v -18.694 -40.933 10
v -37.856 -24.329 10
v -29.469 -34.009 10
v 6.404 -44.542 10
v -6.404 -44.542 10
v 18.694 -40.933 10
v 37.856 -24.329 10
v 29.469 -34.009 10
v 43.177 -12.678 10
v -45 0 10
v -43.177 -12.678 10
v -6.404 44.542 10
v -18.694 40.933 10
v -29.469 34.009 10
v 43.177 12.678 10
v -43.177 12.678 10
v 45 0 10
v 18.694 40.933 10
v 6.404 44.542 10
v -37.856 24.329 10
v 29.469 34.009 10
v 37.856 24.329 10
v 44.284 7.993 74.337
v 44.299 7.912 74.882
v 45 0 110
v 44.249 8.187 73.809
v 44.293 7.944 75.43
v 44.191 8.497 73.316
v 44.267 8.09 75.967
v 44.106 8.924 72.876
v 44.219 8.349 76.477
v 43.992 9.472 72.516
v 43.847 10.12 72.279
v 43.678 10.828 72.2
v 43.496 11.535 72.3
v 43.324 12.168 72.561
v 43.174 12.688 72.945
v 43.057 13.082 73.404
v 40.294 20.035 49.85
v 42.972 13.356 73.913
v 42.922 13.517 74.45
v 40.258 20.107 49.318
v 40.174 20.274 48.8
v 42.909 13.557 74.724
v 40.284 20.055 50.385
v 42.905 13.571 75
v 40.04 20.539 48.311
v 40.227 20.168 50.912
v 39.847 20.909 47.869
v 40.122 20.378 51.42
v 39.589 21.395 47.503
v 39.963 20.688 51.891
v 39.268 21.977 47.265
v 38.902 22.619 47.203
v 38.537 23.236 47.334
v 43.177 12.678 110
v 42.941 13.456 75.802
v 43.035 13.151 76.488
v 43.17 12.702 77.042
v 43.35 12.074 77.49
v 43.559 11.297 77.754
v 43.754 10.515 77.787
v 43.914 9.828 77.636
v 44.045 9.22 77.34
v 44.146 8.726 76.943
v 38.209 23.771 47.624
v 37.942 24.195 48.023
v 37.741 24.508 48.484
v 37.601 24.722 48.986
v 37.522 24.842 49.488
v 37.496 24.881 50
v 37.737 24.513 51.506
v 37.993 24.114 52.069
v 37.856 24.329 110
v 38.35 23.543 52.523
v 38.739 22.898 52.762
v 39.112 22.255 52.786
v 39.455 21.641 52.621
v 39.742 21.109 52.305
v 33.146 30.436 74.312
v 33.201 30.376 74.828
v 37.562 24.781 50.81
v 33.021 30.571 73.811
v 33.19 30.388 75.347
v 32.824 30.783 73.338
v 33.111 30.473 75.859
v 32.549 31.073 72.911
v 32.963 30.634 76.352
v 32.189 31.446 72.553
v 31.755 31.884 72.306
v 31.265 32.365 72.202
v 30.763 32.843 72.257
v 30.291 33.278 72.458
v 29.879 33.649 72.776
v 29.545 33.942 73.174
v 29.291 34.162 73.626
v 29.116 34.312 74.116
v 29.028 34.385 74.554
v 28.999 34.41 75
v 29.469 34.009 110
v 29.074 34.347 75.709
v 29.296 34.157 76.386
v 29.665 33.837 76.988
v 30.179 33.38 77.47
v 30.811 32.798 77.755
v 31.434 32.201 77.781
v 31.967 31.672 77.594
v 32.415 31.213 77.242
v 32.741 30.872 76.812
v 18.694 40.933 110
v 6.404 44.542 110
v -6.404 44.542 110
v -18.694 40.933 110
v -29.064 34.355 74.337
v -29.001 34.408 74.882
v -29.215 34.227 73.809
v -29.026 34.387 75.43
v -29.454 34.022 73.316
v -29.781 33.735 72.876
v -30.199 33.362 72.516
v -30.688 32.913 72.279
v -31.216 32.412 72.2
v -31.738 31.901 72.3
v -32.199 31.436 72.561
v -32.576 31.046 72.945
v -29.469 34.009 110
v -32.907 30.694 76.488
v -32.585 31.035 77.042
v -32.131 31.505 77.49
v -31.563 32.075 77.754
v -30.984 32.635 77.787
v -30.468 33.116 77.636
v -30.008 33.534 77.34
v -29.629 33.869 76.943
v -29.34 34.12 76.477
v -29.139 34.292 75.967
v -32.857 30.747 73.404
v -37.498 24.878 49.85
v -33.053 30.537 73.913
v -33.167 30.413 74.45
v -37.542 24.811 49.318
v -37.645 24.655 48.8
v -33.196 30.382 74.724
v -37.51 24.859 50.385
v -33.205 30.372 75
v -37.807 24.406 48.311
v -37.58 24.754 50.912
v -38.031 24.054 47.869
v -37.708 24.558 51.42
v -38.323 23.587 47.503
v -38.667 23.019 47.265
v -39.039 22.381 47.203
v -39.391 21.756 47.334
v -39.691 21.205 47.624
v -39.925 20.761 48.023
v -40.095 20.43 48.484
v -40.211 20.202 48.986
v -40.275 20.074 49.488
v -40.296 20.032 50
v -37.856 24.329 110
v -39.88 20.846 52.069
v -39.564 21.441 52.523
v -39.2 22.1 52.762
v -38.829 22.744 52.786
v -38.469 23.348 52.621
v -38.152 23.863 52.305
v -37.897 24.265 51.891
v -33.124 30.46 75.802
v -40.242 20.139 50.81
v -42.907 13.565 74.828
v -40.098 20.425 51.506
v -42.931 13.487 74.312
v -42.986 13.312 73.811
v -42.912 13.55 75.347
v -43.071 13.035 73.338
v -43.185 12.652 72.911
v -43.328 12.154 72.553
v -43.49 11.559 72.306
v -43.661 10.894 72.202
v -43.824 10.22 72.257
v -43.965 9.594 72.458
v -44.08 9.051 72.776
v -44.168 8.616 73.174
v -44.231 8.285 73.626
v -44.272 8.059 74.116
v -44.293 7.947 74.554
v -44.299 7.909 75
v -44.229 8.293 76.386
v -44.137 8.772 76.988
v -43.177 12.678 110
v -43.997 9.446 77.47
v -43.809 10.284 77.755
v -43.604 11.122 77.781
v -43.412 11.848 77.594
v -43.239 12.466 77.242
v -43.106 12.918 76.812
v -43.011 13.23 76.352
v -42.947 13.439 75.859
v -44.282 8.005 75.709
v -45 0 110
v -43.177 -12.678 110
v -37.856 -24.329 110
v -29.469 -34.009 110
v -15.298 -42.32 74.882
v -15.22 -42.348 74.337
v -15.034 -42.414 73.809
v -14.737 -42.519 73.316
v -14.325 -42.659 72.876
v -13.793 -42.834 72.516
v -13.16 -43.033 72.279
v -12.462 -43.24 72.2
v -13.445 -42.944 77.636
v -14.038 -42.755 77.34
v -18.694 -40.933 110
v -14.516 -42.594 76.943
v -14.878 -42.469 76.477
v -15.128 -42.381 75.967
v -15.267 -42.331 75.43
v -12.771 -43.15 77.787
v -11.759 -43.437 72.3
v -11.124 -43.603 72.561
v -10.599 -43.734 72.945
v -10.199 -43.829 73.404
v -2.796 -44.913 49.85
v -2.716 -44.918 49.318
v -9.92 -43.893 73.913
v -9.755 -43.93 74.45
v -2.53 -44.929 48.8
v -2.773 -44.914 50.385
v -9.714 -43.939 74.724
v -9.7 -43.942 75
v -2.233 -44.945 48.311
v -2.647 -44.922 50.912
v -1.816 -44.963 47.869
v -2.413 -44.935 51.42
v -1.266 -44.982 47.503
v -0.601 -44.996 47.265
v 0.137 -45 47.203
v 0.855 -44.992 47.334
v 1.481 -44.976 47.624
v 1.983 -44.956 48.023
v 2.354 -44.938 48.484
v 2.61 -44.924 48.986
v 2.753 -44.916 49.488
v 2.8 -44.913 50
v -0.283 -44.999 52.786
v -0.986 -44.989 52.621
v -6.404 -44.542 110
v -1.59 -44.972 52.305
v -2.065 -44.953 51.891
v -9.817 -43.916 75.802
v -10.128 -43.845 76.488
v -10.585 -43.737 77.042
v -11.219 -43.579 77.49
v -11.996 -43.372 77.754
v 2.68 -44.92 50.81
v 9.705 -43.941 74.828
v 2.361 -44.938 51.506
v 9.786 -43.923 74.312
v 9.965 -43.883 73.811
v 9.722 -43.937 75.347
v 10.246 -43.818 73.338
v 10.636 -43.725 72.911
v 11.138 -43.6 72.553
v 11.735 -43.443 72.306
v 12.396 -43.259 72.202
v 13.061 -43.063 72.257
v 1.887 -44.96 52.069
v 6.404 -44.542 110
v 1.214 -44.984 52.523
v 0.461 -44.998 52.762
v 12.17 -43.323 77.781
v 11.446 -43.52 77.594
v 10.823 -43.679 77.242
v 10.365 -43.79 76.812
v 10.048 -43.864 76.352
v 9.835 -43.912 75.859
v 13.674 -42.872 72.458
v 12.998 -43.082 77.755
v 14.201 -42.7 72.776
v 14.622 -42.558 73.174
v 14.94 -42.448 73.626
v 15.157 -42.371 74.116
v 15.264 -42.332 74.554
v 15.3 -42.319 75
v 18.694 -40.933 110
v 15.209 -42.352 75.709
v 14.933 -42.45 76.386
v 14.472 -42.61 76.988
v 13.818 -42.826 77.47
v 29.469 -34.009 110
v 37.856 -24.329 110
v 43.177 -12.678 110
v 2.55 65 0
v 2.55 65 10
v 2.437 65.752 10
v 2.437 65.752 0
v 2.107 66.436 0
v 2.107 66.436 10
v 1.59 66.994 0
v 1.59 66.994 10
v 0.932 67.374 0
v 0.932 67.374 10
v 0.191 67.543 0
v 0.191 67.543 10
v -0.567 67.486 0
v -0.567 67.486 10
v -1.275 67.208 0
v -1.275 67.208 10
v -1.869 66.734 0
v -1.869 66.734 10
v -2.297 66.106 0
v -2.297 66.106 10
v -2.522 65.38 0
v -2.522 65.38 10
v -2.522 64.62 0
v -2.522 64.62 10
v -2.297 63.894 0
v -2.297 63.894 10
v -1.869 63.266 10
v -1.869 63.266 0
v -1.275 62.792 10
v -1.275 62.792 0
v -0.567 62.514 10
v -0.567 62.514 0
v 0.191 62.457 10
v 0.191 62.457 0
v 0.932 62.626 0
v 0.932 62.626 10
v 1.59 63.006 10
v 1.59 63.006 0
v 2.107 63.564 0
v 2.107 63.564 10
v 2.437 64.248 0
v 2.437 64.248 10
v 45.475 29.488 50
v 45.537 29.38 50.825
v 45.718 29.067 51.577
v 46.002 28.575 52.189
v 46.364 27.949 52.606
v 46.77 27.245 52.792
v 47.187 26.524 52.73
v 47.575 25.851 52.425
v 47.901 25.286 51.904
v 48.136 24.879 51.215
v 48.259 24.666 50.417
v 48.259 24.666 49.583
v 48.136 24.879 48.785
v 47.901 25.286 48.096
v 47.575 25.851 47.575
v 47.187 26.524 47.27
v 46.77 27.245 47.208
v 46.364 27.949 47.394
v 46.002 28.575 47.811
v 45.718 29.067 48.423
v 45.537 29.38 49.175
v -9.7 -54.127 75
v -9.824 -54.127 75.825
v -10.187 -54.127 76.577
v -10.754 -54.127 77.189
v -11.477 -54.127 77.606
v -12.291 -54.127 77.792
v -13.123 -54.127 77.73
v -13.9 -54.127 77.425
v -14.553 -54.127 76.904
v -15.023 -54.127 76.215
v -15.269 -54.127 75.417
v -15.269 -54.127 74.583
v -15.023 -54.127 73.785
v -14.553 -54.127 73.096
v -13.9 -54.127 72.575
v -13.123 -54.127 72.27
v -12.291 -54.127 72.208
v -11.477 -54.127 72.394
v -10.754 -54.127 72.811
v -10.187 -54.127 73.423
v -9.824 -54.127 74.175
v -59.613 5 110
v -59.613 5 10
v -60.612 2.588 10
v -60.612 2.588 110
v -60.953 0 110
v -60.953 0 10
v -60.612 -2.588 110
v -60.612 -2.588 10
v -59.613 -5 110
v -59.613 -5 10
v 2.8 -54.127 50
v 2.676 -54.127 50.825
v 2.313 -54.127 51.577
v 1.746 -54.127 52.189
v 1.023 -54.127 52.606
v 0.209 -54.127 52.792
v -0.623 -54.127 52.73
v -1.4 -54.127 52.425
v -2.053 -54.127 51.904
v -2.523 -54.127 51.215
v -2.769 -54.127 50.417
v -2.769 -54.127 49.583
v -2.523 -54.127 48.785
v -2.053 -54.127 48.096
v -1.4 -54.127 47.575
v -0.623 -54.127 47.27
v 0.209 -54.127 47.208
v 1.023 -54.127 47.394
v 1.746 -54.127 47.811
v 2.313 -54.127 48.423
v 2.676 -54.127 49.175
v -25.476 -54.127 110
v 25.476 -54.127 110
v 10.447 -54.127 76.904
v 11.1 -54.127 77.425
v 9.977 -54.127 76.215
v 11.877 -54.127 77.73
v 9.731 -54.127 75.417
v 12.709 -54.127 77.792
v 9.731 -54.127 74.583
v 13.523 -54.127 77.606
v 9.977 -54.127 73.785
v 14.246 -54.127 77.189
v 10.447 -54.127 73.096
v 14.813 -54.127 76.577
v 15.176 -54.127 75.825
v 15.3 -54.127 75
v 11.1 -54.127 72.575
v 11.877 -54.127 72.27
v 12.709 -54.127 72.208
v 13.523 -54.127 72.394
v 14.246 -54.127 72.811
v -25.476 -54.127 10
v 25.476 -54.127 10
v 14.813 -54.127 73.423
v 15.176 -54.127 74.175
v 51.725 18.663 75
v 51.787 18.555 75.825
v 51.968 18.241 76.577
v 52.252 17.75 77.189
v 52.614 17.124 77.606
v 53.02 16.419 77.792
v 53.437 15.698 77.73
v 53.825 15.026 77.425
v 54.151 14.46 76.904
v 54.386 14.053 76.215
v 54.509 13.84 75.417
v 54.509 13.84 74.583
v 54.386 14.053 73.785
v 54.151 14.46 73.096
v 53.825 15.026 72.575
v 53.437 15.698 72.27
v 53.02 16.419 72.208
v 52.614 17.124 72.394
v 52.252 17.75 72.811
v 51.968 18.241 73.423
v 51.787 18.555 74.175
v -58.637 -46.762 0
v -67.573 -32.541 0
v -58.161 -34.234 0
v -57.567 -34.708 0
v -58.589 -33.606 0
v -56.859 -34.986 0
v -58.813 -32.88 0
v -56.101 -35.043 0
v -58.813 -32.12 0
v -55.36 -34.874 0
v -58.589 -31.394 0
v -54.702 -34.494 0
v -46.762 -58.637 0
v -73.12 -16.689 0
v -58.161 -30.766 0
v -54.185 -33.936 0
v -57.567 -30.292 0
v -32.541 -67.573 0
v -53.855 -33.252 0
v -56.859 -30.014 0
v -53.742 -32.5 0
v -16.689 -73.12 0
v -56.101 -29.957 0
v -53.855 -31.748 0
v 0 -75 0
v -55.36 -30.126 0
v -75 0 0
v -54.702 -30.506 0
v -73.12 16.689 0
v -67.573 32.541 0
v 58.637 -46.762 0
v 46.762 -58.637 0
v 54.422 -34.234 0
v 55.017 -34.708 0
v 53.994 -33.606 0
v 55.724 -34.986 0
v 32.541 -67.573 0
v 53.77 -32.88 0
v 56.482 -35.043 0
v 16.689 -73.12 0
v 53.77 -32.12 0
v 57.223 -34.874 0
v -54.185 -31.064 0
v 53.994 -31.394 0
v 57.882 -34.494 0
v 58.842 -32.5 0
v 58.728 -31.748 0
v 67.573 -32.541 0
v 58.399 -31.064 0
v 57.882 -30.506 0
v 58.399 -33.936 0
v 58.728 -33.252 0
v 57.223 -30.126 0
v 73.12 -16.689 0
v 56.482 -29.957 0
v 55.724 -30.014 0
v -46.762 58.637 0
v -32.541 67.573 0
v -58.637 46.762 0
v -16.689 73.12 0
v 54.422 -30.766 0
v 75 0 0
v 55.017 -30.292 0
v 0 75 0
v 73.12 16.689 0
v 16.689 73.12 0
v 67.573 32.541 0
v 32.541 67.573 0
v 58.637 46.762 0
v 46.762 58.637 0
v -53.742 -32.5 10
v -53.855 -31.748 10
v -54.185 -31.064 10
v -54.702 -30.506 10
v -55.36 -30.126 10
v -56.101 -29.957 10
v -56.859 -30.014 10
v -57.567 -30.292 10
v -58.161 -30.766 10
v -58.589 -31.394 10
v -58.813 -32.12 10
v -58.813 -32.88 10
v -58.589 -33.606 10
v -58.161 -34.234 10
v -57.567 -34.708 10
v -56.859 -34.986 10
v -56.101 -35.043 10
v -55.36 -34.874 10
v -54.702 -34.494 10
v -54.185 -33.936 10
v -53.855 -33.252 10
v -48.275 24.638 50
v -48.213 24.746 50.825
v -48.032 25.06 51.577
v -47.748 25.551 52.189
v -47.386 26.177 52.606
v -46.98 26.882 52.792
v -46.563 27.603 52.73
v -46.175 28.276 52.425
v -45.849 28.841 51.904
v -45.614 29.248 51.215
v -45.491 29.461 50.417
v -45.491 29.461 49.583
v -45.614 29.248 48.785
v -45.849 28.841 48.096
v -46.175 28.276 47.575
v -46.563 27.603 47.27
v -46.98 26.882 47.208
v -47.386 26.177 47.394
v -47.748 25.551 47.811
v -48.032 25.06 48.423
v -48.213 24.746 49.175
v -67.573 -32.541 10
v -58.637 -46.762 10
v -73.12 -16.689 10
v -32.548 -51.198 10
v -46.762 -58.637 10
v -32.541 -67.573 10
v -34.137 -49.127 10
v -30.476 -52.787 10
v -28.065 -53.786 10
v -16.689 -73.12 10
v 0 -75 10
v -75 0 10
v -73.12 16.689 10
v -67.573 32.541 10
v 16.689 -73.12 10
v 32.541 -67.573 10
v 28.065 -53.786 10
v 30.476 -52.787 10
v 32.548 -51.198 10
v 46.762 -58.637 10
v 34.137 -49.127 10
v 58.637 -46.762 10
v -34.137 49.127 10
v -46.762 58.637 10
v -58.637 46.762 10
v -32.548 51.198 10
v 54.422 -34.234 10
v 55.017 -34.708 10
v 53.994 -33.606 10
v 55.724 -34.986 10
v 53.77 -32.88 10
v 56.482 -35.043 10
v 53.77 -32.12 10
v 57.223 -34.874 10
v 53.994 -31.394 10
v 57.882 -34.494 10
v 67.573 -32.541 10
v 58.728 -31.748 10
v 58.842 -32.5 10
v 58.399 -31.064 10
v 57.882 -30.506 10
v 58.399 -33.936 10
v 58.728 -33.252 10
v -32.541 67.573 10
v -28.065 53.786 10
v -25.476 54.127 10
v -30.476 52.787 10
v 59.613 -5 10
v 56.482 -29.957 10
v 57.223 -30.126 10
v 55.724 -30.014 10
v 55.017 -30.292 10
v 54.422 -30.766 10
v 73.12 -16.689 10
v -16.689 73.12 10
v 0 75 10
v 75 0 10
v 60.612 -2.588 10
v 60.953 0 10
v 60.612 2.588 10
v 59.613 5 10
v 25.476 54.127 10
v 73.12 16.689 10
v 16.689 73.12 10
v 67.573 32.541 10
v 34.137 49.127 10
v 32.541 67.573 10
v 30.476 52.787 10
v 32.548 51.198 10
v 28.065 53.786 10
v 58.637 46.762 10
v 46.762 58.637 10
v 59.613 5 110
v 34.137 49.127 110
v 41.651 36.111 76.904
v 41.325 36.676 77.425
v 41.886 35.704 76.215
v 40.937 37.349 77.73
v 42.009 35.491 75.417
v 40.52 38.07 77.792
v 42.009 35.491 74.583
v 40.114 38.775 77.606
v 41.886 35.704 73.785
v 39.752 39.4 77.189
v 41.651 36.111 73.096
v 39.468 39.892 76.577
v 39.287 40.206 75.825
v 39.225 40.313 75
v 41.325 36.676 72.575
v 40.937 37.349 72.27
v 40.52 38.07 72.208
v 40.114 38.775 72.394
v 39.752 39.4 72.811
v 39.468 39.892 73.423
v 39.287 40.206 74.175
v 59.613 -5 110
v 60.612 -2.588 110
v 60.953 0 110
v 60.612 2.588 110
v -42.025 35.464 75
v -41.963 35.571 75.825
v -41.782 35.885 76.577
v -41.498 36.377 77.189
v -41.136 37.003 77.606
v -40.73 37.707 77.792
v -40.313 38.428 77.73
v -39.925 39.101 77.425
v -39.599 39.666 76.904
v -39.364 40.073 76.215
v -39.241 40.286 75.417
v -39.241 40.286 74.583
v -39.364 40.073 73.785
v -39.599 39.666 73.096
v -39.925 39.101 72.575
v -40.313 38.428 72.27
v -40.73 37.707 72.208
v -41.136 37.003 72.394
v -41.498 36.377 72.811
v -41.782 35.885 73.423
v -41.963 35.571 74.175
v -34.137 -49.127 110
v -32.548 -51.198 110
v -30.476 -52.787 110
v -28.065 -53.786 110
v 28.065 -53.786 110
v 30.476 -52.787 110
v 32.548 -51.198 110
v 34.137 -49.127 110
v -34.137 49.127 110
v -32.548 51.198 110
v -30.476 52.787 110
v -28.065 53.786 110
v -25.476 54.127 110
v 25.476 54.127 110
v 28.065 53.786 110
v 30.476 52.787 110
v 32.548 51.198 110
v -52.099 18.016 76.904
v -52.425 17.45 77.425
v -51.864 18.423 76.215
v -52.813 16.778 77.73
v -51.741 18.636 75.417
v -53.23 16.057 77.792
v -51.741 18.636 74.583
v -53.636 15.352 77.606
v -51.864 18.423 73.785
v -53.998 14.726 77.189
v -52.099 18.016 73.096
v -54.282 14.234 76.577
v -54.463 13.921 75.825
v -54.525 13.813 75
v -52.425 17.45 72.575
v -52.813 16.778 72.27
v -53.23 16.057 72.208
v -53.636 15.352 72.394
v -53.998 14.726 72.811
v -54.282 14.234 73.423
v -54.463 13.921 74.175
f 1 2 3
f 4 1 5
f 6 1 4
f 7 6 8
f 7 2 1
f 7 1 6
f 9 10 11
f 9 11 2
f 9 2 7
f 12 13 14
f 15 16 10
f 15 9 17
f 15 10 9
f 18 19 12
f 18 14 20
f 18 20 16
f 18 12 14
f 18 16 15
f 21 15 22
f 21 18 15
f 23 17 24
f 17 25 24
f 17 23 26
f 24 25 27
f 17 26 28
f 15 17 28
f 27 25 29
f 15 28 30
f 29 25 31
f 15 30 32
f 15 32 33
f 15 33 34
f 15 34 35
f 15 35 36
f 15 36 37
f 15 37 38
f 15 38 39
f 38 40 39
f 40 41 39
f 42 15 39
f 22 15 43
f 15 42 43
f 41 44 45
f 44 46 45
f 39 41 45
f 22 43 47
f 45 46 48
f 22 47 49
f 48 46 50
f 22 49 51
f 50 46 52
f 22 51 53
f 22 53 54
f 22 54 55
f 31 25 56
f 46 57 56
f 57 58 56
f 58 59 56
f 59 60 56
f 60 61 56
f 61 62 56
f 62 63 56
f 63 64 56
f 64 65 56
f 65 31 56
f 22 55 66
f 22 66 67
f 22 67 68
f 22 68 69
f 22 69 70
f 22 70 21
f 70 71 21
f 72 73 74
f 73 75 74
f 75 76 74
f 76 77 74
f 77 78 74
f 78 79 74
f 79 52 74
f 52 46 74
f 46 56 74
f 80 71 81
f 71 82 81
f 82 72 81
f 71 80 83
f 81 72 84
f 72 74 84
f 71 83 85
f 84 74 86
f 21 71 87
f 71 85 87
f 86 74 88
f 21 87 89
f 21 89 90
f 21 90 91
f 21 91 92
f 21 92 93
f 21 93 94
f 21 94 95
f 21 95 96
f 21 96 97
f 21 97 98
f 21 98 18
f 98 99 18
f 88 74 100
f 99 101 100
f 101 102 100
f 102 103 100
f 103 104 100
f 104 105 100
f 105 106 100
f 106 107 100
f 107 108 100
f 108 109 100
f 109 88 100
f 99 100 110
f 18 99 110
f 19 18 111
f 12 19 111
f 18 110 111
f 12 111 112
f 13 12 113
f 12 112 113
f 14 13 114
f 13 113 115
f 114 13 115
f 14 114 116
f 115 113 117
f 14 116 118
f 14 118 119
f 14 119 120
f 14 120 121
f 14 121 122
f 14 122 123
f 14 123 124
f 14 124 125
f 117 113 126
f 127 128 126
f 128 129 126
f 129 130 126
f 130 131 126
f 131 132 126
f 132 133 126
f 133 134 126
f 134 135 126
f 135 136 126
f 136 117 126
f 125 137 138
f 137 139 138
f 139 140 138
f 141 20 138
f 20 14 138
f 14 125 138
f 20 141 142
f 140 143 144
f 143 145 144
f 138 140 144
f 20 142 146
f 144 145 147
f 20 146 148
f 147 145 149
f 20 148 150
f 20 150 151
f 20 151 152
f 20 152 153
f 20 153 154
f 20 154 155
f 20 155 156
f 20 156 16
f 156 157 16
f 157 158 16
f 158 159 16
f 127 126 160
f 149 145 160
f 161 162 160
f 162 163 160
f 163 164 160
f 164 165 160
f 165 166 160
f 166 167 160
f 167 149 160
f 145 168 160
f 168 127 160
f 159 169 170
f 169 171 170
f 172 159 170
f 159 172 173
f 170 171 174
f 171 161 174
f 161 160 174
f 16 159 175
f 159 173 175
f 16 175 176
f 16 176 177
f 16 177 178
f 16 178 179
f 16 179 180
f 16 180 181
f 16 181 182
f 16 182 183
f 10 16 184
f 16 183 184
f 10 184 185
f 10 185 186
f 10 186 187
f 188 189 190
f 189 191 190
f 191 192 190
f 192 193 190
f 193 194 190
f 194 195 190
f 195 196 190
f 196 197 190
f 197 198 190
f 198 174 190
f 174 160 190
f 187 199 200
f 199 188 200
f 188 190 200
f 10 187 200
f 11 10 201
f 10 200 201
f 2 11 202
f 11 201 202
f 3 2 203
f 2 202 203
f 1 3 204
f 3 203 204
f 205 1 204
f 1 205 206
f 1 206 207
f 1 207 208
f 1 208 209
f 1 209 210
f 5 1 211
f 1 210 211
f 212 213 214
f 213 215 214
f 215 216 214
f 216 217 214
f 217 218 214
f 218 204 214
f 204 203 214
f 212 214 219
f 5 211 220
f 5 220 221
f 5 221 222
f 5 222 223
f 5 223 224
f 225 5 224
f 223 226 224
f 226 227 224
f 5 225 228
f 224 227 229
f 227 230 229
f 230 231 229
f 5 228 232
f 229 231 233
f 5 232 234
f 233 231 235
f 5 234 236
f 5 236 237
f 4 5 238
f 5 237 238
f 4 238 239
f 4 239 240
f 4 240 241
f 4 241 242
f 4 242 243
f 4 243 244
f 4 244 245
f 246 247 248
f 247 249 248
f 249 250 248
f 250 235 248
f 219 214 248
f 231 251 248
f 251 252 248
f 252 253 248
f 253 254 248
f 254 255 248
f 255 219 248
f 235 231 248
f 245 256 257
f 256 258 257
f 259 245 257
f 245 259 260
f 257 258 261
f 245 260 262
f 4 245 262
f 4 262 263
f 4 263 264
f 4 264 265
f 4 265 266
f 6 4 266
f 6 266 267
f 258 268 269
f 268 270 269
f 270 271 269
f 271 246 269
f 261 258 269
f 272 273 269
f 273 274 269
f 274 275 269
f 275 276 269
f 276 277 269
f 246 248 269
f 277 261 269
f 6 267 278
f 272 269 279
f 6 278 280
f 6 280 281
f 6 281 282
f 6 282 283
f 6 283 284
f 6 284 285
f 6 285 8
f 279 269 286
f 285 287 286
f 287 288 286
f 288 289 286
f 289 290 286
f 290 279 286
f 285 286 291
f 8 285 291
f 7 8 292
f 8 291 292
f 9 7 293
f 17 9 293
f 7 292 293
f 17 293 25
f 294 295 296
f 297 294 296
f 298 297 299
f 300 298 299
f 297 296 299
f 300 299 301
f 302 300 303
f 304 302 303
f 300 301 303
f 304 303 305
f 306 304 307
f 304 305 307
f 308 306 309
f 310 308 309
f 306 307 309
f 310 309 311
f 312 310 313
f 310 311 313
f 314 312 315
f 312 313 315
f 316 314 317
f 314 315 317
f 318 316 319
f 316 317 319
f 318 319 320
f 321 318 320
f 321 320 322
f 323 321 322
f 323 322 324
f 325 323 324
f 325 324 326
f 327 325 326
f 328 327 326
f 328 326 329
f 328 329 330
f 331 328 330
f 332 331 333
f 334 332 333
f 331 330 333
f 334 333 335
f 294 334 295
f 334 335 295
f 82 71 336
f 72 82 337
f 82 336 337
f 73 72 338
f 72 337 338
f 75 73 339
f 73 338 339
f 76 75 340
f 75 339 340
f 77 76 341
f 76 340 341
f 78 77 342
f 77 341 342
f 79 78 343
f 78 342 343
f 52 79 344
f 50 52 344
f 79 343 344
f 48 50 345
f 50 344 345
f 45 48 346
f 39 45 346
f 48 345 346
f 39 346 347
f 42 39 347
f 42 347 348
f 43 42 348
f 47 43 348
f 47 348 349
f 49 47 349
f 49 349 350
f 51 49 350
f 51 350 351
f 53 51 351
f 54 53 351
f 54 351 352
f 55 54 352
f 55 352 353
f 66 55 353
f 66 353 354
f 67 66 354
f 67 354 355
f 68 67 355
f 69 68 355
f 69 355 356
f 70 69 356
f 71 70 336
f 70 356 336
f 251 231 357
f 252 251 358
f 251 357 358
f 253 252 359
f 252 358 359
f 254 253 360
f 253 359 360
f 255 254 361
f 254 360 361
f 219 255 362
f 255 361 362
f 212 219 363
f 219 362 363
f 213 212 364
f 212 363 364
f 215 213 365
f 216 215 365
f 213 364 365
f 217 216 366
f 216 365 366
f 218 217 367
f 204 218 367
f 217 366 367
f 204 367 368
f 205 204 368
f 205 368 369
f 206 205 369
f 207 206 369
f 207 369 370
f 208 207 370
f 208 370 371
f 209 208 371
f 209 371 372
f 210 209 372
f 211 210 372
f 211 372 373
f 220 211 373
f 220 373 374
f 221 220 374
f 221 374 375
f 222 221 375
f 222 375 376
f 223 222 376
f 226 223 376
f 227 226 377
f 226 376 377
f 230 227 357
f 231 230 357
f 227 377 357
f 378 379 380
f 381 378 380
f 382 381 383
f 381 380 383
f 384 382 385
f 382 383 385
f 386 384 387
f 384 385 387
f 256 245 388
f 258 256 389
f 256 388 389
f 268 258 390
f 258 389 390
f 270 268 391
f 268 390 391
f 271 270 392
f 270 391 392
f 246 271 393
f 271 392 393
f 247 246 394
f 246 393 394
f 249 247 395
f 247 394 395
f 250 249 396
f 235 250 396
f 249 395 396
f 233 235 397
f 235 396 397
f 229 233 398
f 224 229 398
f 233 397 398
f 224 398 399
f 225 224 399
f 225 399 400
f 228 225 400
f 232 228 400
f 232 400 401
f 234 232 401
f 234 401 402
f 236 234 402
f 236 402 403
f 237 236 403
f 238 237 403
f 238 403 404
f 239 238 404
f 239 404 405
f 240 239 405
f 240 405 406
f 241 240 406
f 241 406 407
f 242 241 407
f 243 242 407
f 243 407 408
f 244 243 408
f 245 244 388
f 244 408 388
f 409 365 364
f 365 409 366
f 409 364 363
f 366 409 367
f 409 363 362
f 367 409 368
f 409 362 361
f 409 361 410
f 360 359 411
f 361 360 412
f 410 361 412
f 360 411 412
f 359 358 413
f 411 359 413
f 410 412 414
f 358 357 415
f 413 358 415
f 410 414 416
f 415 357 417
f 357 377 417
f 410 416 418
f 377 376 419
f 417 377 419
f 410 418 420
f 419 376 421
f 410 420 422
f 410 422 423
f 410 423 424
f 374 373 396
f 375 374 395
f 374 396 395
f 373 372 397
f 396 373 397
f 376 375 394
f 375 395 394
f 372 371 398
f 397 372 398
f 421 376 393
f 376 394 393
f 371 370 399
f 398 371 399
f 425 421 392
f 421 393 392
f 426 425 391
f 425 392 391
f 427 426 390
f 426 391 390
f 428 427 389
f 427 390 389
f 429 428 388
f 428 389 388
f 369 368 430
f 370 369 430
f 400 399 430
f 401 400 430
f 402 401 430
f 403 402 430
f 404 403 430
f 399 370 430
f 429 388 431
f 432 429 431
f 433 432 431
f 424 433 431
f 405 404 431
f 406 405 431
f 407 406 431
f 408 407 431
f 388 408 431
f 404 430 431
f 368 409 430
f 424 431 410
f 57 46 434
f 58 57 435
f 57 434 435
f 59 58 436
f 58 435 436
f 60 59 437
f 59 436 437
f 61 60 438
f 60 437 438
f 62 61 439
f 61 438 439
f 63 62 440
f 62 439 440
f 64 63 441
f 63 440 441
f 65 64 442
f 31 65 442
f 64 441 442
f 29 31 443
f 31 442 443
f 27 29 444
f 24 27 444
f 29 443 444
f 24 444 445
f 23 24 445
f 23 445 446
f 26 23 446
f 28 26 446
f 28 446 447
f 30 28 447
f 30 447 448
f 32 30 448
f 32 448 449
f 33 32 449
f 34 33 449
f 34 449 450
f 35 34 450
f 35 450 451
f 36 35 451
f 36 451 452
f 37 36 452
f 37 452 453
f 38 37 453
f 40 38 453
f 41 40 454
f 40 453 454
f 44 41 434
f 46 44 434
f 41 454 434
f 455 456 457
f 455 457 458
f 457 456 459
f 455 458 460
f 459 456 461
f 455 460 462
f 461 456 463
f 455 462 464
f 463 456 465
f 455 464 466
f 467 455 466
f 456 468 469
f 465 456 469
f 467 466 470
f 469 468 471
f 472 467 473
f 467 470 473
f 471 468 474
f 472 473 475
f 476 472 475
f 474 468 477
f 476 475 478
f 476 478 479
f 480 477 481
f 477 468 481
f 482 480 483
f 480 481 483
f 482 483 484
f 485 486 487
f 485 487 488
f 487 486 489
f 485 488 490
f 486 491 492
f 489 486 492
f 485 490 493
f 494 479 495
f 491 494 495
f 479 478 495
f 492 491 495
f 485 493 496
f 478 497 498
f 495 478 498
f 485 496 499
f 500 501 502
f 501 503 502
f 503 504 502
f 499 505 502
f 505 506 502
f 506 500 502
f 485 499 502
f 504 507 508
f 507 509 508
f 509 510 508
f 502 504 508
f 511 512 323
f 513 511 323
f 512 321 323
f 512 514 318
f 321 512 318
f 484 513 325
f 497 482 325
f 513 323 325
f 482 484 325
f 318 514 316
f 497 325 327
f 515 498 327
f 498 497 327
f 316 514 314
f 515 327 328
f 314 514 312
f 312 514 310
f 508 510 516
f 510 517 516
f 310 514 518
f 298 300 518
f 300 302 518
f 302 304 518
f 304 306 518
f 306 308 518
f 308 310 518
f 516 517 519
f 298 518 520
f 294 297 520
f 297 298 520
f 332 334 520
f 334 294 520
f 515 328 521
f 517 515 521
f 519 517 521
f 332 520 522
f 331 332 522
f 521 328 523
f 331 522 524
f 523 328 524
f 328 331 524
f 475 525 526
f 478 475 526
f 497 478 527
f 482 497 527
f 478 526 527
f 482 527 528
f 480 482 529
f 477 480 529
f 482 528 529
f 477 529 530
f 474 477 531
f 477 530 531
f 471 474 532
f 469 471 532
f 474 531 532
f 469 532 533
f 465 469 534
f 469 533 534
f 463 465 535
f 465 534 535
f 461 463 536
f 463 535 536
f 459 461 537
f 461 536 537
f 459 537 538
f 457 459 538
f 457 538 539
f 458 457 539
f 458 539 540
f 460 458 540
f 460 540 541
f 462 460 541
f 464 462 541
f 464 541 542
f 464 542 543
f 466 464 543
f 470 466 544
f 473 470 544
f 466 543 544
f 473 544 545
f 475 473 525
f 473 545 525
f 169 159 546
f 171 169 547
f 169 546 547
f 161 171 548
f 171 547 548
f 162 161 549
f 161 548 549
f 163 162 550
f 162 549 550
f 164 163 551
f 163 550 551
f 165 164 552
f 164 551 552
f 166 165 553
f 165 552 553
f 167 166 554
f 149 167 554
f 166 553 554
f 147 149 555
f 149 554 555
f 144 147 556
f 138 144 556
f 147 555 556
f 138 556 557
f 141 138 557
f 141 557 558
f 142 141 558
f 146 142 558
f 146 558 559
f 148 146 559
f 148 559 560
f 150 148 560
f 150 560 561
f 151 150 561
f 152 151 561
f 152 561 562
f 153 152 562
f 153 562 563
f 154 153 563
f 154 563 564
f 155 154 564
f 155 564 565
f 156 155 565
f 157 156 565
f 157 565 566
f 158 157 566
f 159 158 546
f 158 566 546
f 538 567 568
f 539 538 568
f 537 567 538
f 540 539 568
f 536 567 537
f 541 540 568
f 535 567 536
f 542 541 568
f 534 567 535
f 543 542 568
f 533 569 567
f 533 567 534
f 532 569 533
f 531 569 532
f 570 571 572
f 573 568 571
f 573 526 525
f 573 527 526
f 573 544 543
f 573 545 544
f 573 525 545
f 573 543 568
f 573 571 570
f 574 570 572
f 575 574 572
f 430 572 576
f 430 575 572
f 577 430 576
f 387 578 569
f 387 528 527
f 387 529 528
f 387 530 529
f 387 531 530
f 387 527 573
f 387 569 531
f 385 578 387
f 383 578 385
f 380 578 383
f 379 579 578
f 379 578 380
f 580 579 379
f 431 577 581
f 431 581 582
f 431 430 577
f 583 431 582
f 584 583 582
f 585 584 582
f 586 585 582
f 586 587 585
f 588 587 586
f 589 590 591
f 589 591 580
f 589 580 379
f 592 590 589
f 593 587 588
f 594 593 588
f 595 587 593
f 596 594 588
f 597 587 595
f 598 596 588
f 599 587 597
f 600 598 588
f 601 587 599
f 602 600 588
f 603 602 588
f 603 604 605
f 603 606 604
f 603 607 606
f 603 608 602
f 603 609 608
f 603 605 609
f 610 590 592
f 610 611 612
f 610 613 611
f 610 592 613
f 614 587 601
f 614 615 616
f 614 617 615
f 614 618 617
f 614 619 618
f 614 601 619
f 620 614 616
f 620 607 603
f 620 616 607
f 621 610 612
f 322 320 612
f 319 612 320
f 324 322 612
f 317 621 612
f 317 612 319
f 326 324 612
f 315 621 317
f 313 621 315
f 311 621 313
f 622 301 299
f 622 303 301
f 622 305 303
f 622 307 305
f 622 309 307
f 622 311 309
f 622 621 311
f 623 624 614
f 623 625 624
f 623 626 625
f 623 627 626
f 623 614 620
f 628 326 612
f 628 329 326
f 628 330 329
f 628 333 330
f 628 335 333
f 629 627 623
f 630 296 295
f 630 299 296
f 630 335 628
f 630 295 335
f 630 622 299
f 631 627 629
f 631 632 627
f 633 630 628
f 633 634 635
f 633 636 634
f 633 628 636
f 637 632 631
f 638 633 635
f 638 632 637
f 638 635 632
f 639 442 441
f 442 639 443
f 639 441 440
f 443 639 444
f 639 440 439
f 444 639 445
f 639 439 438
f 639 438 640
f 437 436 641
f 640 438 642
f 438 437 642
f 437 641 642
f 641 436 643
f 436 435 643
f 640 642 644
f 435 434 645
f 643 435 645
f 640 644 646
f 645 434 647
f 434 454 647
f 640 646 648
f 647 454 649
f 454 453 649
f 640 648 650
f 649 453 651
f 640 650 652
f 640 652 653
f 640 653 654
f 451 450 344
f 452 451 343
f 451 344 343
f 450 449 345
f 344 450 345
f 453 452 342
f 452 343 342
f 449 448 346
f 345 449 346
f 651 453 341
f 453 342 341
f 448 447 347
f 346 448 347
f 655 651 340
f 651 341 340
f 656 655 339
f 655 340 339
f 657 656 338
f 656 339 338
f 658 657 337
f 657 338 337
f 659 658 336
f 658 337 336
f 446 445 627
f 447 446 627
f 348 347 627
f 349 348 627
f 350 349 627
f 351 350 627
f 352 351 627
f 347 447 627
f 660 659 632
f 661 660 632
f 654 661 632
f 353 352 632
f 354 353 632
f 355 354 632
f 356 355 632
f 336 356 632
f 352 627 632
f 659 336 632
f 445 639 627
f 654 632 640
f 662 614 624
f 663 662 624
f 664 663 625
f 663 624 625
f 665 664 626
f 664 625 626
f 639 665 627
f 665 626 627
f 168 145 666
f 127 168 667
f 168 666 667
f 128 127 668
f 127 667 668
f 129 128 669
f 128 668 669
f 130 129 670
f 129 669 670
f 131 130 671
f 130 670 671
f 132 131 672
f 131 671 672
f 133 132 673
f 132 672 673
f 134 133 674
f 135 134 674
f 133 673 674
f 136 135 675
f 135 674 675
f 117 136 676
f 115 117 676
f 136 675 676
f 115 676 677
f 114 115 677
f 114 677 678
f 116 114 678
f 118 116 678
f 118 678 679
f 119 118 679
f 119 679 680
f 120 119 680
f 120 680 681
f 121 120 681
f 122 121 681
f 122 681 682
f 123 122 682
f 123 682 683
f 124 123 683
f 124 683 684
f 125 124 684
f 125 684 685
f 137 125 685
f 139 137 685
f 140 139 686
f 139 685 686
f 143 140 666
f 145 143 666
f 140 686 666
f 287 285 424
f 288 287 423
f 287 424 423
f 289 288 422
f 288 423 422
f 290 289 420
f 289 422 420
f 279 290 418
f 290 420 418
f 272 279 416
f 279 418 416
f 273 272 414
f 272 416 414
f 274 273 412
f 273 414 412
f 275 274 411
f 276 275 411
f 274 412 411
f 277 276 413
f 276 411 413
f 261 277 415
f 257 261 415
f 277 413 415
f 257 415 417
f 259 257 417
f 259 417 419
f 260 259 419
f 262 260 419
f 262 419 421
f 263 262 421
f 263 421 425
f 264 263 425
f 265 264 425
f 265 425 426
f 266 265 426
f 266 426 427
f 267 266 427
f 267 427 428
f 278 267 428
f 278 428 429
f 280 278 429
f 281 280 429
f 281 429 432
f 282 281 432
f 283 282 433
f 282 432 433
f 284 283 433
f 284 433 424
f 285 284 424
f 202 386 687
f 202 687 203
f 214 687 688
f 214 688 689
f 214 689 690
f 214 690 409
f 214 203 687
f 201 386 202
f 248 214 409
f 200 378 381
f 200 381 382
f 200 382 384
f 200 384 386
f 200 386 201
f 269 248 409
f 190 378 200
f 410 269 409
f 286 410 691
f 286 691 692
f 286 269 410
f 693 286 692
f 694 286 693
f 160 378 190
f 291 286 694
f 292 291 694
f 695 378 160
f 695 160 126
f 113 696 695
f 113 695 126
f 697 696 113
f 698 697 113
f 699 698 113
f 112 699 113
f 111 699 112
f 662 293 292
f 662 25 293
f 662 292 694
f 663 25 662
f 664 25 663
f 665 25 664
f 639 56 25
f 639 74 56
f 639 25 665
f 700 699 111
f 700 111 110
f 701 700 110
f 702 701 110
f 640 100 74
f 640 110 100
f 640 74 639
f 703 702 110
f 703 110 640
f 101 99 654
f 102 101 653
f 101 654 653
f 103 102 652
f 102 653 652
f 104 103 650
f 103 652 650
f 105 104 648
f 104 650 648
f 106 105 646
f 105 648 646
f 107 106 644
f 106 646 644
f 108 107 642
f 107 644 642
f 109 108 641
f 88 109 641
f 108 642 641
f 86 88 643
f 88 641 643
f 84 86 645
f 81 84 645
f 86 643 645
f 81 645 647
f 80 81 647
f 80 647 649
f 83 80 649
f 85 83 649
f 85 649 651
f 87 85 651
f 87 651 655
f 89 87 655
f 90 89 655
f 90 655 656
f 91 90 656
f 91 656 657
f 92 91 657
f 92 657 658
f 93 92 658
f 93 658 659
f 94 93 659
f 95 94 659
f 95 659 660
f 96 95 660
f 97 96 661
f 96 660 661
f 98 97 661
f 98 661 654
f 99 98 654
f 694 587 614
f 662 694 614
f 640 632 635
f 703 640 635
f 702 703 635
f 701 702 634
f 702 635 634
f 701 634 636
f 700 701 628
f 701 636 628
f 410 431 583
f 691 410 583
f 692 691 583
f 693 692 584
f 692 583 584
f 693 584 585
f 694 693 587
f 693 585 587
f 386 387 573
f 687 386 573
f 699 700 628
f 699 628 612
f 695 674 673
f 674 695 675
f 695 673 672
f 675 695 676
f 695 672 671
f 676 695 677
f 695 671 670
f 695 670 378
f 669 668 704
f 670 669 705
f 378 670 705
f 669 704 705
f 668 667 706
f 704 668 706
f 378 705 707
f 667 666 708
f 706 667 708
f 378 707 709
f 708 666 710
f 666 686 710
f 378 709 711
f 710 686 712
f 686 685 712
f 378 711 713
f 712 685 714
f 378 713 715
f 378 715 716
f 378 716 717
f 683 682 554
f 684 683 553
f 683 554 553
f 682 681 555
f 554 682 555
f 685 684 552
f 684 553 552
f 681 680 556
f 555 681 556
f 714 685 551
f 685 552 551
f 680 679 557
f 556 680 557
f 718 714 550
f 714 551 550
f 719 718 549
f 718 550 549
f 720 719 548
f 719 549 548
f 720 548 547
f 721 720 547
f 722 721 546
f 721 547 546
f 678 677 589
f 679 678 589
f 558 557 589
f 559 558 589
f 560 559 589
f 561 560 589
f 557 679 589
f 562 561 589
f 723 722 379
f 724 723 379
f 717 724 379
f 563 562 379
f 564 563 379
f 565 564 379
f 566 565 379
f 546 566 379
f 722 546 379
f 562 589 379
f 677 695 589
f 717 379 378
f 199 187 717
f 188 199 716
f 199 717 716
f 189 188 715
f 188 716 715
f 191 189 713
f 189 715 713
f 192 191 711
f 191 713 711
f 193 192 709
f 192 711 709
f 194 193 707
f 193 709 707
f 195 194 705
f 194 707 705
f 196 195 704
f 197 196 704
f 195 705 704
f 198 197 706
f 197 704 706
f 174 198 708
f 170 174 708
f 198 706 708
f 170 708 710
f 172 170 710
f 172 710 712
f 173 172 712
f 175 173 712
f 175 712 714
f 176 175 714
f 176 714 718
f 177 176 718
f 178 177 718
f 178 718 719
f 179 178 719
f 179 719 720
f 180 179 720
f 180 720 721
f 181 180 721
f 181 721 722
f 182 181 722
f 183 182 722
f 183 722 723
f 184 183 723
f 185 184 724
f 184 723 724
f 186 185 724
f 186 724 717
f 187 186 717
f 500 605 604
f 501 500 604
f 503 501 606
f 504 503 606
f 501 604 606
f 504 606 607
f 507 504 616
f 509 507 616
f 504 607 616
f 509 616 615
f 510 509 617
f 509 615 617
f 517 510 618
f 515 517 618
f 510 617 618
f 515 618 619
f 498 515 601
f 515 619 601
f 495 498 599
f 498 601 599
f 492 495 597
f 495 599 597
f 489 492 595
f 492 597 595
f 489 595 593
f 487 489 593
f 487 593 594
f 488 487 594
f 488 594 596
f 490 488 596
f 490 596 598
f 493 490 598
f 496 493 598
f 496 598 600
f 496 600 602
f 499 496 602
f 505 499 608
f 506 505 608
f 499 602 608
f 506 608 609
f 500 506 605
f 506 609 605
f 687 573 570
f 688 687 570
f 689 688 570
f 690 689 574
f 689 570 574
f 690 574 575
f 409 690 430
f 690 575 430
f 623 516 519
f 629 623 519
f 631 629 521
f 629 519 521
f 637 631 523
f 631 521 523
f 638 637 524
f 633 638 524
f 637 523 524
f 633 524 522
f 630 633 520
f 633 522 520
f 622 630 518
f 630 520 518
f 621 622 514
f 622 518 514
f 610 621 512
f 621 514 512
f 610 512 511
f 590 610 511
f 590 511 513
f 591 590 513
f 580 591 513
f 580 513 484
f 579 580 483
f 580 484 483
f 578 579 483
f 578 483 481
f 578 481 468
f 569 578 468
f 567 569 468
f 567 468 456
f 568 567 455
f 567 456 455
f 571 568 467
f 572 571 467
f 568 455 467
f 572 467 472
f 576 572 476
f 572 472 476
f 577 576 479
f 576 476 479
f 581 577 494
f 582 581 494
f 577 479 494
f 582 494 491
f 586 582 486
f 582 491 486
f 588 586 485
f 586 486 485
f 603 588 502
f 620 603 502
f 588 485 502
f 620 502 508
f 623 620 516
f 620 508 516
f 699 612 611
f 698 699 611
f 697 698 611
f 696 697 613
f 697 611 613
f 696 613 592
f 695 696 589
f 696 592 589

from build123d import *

# Parameters (mm, degrees)
SKETCH1_R               = 75
BOSS_EXTRUDE1_DEPTH     = 10
BOSS_EXTRUDE2_DEPTH     = 100
SKETCH4_R               = 45
CUT_EXTRUDE1_DEPTH      = 100
CUT_EXTRUDE2_REACH      = 187.469
CUT_EXTRUDE2_END_RADIUS = 45
SKETCH5_R               = 2.8
CIRPATTERN1_COUNT       = 3
SKETCH7_R               = 2.55
CUT_EXTRUDE3_DEPTH      = 10


with BuildPart() as part:
    # Sketch1 → Boss-Extrude1 (new body)
    with BuildSketch(Plane.XY):
        Circle(SKETCH1_R)
    extrude(amount=BOSS_EXTRUDE1_DEPTH)

    # Sketch2 → Boss-Extrude2 (add)
    with BuildSketch(Plane.XY.offset(10)):
        with BuildLine():
            Line((59.613248654, 5), (34.136751346, 49.126587737))
            ThreePointArc((34.136751346, 49.126587737), (30.476497308, 52.786841774), (25.476497308, 54.126587737))
            Line((25.476497308, 54.126587737), (-25.476497308, 54.126587737))
            ThreePointArc((-25.476497308, 54.126587737), (-30.476497308, 52.786841774), (-34.136751346, 49.126587737))
            Line((-34.136751346, 49.126587737), (-59.613248654, 5))
            ThreePointArc((-59.613248654, 5), (-60.952994616, 0), (-59.613248654, -5))
            Line((-59.613248654, -5), (-34.136751346, -49.126587737))
            ThreePointArc((-34.136751346, -49.126587737), (-30.476497308, -52.786841774), (-25.476497308, -54.126587737))
            Line((-25.476497308, -54.126587737), (25.476497308, -54.126587737))
            ThreePointArc((25.476497308, -54.126587737), (30.476497308, -52.786841774), (34.136751346, -49.126587737))
            Line((34.136751346, -49.126587737), (59.613248654, -5))
            ThreePointArc((59.613248654, -5), (60.952994616, 0), (59.613248654, 5))
        make_face()
    extrude(amount=BOSS_EXTRUDE2_DEPTH)

    # Sketch4 → Cut-Extrude1 (cut)
    with BuildSketch(Plane.XY.offset(110)):
        Circle(SKETCH4_R)
    extrude(amount=-CUT_EXTRUDE1_DEPTH, mode=Mode.SUBTRACT)

    # Cut-Extrude2: up to this cylinder (the profile starts outside it)
    cut_extrude2_end = Plane(origin=(0, 0, 62.5), z_dir=(0, 0, 1)) * Cylinder(CUT_EXTRUDE2_END_RADIUS, 490.938, mode=Mode.PRIVATE)
    # Sketch5 → Cut-Extrude2 (cut, up to the surface)
    with BuildSketch(Plane.XZ.offset(54.126587737), mode=Mode.PRIVATE) as cut_extrude2_sk1:
        with Locations((0, 50)):
            Circle(SKETCH5_R)
    cut_extrude2_tool1 = extrude(cut_extrude2_sk1.sketch, amount=-CUT_EXTRUDE2_REACH, mode=Mode.PRIVATE) - cut_extrude2_end
    # Sketch5 → Cut-Extrude2 (cut, up to the surface)
    with BuildSketch(Plane.XZ.offset(54.126587737), mode=Mode.PRIVATE) as cut_extrude2_sk2:
        with Locations((-12.5, 75)):
            Circle(SKETCH5_R)
    cut_extrude2_tool2 = extrude(cut_extrude2_sk2.sketch, amount=-CUT_EXTRUDE2_REACH, mode=Mode.PRIVATE) - cut_extrude2_end
    # Sketch5 → Cut-Extrude2 (cut, up to the surface)
    with BuildSketch(Plane.XZ.offset(54.126587737), mode=Mode.PRIVATE) as cut_extrude2_sk3:
        with Locations((12.5, 75)):
            Circle(SKETCH5_R)
    cut_extrude2_tool3 = extrude(cut_extrude2_sk3.sketch, amount=-CUT_EXTRUDE2_REACH, mode=Mode.PRIVATE) - cut_extrude2_end
    cut_extrude2 = cut_extrude2_tool1.solids().sort_by_distance((0, -54.126588, 50))[0] + cut_extrude2_tool2.solids().sort_by_distance((-12.5, -54.126588, 75))[0] + cut_extrude2_tool3.solids().sort_by_distance((12.5, -54.126588, 75))[0]
    add(cut_extrude2, mode=Mode.SUBTRACT)

    # CirPattern1: Cut-Extrude2 ×3 about axis
    cirpattern1_axis = Axis((0, 0, -117.279220614), (0, 0, 1))
    for i in range(1, CIRPATTERN1_COUNT):
        add(cut_extrude2.rotate(cirpattern1_axis, i * 360 / CIRPATTERN1_COUNT), mode=Mode.SUBTRACT)

    # Sketch7 → Cut-Extrude3 (cut)
    with BuildSketch(Plane.XY.offset(10)):
        with Locations((0, 65)):
            Circle(SKETCH7_R)
        with Locations((56.291651246, -32.5)):
            Circle(SKETCH7_R)
        with Locations((-56.291651246, -32.5)):
            Circle(SKETCH7_R)
    extrude(amount=-CUT_EXTRUDE3_DEPTH, mode=Mode.SUBTRACT)


solid = part.part
